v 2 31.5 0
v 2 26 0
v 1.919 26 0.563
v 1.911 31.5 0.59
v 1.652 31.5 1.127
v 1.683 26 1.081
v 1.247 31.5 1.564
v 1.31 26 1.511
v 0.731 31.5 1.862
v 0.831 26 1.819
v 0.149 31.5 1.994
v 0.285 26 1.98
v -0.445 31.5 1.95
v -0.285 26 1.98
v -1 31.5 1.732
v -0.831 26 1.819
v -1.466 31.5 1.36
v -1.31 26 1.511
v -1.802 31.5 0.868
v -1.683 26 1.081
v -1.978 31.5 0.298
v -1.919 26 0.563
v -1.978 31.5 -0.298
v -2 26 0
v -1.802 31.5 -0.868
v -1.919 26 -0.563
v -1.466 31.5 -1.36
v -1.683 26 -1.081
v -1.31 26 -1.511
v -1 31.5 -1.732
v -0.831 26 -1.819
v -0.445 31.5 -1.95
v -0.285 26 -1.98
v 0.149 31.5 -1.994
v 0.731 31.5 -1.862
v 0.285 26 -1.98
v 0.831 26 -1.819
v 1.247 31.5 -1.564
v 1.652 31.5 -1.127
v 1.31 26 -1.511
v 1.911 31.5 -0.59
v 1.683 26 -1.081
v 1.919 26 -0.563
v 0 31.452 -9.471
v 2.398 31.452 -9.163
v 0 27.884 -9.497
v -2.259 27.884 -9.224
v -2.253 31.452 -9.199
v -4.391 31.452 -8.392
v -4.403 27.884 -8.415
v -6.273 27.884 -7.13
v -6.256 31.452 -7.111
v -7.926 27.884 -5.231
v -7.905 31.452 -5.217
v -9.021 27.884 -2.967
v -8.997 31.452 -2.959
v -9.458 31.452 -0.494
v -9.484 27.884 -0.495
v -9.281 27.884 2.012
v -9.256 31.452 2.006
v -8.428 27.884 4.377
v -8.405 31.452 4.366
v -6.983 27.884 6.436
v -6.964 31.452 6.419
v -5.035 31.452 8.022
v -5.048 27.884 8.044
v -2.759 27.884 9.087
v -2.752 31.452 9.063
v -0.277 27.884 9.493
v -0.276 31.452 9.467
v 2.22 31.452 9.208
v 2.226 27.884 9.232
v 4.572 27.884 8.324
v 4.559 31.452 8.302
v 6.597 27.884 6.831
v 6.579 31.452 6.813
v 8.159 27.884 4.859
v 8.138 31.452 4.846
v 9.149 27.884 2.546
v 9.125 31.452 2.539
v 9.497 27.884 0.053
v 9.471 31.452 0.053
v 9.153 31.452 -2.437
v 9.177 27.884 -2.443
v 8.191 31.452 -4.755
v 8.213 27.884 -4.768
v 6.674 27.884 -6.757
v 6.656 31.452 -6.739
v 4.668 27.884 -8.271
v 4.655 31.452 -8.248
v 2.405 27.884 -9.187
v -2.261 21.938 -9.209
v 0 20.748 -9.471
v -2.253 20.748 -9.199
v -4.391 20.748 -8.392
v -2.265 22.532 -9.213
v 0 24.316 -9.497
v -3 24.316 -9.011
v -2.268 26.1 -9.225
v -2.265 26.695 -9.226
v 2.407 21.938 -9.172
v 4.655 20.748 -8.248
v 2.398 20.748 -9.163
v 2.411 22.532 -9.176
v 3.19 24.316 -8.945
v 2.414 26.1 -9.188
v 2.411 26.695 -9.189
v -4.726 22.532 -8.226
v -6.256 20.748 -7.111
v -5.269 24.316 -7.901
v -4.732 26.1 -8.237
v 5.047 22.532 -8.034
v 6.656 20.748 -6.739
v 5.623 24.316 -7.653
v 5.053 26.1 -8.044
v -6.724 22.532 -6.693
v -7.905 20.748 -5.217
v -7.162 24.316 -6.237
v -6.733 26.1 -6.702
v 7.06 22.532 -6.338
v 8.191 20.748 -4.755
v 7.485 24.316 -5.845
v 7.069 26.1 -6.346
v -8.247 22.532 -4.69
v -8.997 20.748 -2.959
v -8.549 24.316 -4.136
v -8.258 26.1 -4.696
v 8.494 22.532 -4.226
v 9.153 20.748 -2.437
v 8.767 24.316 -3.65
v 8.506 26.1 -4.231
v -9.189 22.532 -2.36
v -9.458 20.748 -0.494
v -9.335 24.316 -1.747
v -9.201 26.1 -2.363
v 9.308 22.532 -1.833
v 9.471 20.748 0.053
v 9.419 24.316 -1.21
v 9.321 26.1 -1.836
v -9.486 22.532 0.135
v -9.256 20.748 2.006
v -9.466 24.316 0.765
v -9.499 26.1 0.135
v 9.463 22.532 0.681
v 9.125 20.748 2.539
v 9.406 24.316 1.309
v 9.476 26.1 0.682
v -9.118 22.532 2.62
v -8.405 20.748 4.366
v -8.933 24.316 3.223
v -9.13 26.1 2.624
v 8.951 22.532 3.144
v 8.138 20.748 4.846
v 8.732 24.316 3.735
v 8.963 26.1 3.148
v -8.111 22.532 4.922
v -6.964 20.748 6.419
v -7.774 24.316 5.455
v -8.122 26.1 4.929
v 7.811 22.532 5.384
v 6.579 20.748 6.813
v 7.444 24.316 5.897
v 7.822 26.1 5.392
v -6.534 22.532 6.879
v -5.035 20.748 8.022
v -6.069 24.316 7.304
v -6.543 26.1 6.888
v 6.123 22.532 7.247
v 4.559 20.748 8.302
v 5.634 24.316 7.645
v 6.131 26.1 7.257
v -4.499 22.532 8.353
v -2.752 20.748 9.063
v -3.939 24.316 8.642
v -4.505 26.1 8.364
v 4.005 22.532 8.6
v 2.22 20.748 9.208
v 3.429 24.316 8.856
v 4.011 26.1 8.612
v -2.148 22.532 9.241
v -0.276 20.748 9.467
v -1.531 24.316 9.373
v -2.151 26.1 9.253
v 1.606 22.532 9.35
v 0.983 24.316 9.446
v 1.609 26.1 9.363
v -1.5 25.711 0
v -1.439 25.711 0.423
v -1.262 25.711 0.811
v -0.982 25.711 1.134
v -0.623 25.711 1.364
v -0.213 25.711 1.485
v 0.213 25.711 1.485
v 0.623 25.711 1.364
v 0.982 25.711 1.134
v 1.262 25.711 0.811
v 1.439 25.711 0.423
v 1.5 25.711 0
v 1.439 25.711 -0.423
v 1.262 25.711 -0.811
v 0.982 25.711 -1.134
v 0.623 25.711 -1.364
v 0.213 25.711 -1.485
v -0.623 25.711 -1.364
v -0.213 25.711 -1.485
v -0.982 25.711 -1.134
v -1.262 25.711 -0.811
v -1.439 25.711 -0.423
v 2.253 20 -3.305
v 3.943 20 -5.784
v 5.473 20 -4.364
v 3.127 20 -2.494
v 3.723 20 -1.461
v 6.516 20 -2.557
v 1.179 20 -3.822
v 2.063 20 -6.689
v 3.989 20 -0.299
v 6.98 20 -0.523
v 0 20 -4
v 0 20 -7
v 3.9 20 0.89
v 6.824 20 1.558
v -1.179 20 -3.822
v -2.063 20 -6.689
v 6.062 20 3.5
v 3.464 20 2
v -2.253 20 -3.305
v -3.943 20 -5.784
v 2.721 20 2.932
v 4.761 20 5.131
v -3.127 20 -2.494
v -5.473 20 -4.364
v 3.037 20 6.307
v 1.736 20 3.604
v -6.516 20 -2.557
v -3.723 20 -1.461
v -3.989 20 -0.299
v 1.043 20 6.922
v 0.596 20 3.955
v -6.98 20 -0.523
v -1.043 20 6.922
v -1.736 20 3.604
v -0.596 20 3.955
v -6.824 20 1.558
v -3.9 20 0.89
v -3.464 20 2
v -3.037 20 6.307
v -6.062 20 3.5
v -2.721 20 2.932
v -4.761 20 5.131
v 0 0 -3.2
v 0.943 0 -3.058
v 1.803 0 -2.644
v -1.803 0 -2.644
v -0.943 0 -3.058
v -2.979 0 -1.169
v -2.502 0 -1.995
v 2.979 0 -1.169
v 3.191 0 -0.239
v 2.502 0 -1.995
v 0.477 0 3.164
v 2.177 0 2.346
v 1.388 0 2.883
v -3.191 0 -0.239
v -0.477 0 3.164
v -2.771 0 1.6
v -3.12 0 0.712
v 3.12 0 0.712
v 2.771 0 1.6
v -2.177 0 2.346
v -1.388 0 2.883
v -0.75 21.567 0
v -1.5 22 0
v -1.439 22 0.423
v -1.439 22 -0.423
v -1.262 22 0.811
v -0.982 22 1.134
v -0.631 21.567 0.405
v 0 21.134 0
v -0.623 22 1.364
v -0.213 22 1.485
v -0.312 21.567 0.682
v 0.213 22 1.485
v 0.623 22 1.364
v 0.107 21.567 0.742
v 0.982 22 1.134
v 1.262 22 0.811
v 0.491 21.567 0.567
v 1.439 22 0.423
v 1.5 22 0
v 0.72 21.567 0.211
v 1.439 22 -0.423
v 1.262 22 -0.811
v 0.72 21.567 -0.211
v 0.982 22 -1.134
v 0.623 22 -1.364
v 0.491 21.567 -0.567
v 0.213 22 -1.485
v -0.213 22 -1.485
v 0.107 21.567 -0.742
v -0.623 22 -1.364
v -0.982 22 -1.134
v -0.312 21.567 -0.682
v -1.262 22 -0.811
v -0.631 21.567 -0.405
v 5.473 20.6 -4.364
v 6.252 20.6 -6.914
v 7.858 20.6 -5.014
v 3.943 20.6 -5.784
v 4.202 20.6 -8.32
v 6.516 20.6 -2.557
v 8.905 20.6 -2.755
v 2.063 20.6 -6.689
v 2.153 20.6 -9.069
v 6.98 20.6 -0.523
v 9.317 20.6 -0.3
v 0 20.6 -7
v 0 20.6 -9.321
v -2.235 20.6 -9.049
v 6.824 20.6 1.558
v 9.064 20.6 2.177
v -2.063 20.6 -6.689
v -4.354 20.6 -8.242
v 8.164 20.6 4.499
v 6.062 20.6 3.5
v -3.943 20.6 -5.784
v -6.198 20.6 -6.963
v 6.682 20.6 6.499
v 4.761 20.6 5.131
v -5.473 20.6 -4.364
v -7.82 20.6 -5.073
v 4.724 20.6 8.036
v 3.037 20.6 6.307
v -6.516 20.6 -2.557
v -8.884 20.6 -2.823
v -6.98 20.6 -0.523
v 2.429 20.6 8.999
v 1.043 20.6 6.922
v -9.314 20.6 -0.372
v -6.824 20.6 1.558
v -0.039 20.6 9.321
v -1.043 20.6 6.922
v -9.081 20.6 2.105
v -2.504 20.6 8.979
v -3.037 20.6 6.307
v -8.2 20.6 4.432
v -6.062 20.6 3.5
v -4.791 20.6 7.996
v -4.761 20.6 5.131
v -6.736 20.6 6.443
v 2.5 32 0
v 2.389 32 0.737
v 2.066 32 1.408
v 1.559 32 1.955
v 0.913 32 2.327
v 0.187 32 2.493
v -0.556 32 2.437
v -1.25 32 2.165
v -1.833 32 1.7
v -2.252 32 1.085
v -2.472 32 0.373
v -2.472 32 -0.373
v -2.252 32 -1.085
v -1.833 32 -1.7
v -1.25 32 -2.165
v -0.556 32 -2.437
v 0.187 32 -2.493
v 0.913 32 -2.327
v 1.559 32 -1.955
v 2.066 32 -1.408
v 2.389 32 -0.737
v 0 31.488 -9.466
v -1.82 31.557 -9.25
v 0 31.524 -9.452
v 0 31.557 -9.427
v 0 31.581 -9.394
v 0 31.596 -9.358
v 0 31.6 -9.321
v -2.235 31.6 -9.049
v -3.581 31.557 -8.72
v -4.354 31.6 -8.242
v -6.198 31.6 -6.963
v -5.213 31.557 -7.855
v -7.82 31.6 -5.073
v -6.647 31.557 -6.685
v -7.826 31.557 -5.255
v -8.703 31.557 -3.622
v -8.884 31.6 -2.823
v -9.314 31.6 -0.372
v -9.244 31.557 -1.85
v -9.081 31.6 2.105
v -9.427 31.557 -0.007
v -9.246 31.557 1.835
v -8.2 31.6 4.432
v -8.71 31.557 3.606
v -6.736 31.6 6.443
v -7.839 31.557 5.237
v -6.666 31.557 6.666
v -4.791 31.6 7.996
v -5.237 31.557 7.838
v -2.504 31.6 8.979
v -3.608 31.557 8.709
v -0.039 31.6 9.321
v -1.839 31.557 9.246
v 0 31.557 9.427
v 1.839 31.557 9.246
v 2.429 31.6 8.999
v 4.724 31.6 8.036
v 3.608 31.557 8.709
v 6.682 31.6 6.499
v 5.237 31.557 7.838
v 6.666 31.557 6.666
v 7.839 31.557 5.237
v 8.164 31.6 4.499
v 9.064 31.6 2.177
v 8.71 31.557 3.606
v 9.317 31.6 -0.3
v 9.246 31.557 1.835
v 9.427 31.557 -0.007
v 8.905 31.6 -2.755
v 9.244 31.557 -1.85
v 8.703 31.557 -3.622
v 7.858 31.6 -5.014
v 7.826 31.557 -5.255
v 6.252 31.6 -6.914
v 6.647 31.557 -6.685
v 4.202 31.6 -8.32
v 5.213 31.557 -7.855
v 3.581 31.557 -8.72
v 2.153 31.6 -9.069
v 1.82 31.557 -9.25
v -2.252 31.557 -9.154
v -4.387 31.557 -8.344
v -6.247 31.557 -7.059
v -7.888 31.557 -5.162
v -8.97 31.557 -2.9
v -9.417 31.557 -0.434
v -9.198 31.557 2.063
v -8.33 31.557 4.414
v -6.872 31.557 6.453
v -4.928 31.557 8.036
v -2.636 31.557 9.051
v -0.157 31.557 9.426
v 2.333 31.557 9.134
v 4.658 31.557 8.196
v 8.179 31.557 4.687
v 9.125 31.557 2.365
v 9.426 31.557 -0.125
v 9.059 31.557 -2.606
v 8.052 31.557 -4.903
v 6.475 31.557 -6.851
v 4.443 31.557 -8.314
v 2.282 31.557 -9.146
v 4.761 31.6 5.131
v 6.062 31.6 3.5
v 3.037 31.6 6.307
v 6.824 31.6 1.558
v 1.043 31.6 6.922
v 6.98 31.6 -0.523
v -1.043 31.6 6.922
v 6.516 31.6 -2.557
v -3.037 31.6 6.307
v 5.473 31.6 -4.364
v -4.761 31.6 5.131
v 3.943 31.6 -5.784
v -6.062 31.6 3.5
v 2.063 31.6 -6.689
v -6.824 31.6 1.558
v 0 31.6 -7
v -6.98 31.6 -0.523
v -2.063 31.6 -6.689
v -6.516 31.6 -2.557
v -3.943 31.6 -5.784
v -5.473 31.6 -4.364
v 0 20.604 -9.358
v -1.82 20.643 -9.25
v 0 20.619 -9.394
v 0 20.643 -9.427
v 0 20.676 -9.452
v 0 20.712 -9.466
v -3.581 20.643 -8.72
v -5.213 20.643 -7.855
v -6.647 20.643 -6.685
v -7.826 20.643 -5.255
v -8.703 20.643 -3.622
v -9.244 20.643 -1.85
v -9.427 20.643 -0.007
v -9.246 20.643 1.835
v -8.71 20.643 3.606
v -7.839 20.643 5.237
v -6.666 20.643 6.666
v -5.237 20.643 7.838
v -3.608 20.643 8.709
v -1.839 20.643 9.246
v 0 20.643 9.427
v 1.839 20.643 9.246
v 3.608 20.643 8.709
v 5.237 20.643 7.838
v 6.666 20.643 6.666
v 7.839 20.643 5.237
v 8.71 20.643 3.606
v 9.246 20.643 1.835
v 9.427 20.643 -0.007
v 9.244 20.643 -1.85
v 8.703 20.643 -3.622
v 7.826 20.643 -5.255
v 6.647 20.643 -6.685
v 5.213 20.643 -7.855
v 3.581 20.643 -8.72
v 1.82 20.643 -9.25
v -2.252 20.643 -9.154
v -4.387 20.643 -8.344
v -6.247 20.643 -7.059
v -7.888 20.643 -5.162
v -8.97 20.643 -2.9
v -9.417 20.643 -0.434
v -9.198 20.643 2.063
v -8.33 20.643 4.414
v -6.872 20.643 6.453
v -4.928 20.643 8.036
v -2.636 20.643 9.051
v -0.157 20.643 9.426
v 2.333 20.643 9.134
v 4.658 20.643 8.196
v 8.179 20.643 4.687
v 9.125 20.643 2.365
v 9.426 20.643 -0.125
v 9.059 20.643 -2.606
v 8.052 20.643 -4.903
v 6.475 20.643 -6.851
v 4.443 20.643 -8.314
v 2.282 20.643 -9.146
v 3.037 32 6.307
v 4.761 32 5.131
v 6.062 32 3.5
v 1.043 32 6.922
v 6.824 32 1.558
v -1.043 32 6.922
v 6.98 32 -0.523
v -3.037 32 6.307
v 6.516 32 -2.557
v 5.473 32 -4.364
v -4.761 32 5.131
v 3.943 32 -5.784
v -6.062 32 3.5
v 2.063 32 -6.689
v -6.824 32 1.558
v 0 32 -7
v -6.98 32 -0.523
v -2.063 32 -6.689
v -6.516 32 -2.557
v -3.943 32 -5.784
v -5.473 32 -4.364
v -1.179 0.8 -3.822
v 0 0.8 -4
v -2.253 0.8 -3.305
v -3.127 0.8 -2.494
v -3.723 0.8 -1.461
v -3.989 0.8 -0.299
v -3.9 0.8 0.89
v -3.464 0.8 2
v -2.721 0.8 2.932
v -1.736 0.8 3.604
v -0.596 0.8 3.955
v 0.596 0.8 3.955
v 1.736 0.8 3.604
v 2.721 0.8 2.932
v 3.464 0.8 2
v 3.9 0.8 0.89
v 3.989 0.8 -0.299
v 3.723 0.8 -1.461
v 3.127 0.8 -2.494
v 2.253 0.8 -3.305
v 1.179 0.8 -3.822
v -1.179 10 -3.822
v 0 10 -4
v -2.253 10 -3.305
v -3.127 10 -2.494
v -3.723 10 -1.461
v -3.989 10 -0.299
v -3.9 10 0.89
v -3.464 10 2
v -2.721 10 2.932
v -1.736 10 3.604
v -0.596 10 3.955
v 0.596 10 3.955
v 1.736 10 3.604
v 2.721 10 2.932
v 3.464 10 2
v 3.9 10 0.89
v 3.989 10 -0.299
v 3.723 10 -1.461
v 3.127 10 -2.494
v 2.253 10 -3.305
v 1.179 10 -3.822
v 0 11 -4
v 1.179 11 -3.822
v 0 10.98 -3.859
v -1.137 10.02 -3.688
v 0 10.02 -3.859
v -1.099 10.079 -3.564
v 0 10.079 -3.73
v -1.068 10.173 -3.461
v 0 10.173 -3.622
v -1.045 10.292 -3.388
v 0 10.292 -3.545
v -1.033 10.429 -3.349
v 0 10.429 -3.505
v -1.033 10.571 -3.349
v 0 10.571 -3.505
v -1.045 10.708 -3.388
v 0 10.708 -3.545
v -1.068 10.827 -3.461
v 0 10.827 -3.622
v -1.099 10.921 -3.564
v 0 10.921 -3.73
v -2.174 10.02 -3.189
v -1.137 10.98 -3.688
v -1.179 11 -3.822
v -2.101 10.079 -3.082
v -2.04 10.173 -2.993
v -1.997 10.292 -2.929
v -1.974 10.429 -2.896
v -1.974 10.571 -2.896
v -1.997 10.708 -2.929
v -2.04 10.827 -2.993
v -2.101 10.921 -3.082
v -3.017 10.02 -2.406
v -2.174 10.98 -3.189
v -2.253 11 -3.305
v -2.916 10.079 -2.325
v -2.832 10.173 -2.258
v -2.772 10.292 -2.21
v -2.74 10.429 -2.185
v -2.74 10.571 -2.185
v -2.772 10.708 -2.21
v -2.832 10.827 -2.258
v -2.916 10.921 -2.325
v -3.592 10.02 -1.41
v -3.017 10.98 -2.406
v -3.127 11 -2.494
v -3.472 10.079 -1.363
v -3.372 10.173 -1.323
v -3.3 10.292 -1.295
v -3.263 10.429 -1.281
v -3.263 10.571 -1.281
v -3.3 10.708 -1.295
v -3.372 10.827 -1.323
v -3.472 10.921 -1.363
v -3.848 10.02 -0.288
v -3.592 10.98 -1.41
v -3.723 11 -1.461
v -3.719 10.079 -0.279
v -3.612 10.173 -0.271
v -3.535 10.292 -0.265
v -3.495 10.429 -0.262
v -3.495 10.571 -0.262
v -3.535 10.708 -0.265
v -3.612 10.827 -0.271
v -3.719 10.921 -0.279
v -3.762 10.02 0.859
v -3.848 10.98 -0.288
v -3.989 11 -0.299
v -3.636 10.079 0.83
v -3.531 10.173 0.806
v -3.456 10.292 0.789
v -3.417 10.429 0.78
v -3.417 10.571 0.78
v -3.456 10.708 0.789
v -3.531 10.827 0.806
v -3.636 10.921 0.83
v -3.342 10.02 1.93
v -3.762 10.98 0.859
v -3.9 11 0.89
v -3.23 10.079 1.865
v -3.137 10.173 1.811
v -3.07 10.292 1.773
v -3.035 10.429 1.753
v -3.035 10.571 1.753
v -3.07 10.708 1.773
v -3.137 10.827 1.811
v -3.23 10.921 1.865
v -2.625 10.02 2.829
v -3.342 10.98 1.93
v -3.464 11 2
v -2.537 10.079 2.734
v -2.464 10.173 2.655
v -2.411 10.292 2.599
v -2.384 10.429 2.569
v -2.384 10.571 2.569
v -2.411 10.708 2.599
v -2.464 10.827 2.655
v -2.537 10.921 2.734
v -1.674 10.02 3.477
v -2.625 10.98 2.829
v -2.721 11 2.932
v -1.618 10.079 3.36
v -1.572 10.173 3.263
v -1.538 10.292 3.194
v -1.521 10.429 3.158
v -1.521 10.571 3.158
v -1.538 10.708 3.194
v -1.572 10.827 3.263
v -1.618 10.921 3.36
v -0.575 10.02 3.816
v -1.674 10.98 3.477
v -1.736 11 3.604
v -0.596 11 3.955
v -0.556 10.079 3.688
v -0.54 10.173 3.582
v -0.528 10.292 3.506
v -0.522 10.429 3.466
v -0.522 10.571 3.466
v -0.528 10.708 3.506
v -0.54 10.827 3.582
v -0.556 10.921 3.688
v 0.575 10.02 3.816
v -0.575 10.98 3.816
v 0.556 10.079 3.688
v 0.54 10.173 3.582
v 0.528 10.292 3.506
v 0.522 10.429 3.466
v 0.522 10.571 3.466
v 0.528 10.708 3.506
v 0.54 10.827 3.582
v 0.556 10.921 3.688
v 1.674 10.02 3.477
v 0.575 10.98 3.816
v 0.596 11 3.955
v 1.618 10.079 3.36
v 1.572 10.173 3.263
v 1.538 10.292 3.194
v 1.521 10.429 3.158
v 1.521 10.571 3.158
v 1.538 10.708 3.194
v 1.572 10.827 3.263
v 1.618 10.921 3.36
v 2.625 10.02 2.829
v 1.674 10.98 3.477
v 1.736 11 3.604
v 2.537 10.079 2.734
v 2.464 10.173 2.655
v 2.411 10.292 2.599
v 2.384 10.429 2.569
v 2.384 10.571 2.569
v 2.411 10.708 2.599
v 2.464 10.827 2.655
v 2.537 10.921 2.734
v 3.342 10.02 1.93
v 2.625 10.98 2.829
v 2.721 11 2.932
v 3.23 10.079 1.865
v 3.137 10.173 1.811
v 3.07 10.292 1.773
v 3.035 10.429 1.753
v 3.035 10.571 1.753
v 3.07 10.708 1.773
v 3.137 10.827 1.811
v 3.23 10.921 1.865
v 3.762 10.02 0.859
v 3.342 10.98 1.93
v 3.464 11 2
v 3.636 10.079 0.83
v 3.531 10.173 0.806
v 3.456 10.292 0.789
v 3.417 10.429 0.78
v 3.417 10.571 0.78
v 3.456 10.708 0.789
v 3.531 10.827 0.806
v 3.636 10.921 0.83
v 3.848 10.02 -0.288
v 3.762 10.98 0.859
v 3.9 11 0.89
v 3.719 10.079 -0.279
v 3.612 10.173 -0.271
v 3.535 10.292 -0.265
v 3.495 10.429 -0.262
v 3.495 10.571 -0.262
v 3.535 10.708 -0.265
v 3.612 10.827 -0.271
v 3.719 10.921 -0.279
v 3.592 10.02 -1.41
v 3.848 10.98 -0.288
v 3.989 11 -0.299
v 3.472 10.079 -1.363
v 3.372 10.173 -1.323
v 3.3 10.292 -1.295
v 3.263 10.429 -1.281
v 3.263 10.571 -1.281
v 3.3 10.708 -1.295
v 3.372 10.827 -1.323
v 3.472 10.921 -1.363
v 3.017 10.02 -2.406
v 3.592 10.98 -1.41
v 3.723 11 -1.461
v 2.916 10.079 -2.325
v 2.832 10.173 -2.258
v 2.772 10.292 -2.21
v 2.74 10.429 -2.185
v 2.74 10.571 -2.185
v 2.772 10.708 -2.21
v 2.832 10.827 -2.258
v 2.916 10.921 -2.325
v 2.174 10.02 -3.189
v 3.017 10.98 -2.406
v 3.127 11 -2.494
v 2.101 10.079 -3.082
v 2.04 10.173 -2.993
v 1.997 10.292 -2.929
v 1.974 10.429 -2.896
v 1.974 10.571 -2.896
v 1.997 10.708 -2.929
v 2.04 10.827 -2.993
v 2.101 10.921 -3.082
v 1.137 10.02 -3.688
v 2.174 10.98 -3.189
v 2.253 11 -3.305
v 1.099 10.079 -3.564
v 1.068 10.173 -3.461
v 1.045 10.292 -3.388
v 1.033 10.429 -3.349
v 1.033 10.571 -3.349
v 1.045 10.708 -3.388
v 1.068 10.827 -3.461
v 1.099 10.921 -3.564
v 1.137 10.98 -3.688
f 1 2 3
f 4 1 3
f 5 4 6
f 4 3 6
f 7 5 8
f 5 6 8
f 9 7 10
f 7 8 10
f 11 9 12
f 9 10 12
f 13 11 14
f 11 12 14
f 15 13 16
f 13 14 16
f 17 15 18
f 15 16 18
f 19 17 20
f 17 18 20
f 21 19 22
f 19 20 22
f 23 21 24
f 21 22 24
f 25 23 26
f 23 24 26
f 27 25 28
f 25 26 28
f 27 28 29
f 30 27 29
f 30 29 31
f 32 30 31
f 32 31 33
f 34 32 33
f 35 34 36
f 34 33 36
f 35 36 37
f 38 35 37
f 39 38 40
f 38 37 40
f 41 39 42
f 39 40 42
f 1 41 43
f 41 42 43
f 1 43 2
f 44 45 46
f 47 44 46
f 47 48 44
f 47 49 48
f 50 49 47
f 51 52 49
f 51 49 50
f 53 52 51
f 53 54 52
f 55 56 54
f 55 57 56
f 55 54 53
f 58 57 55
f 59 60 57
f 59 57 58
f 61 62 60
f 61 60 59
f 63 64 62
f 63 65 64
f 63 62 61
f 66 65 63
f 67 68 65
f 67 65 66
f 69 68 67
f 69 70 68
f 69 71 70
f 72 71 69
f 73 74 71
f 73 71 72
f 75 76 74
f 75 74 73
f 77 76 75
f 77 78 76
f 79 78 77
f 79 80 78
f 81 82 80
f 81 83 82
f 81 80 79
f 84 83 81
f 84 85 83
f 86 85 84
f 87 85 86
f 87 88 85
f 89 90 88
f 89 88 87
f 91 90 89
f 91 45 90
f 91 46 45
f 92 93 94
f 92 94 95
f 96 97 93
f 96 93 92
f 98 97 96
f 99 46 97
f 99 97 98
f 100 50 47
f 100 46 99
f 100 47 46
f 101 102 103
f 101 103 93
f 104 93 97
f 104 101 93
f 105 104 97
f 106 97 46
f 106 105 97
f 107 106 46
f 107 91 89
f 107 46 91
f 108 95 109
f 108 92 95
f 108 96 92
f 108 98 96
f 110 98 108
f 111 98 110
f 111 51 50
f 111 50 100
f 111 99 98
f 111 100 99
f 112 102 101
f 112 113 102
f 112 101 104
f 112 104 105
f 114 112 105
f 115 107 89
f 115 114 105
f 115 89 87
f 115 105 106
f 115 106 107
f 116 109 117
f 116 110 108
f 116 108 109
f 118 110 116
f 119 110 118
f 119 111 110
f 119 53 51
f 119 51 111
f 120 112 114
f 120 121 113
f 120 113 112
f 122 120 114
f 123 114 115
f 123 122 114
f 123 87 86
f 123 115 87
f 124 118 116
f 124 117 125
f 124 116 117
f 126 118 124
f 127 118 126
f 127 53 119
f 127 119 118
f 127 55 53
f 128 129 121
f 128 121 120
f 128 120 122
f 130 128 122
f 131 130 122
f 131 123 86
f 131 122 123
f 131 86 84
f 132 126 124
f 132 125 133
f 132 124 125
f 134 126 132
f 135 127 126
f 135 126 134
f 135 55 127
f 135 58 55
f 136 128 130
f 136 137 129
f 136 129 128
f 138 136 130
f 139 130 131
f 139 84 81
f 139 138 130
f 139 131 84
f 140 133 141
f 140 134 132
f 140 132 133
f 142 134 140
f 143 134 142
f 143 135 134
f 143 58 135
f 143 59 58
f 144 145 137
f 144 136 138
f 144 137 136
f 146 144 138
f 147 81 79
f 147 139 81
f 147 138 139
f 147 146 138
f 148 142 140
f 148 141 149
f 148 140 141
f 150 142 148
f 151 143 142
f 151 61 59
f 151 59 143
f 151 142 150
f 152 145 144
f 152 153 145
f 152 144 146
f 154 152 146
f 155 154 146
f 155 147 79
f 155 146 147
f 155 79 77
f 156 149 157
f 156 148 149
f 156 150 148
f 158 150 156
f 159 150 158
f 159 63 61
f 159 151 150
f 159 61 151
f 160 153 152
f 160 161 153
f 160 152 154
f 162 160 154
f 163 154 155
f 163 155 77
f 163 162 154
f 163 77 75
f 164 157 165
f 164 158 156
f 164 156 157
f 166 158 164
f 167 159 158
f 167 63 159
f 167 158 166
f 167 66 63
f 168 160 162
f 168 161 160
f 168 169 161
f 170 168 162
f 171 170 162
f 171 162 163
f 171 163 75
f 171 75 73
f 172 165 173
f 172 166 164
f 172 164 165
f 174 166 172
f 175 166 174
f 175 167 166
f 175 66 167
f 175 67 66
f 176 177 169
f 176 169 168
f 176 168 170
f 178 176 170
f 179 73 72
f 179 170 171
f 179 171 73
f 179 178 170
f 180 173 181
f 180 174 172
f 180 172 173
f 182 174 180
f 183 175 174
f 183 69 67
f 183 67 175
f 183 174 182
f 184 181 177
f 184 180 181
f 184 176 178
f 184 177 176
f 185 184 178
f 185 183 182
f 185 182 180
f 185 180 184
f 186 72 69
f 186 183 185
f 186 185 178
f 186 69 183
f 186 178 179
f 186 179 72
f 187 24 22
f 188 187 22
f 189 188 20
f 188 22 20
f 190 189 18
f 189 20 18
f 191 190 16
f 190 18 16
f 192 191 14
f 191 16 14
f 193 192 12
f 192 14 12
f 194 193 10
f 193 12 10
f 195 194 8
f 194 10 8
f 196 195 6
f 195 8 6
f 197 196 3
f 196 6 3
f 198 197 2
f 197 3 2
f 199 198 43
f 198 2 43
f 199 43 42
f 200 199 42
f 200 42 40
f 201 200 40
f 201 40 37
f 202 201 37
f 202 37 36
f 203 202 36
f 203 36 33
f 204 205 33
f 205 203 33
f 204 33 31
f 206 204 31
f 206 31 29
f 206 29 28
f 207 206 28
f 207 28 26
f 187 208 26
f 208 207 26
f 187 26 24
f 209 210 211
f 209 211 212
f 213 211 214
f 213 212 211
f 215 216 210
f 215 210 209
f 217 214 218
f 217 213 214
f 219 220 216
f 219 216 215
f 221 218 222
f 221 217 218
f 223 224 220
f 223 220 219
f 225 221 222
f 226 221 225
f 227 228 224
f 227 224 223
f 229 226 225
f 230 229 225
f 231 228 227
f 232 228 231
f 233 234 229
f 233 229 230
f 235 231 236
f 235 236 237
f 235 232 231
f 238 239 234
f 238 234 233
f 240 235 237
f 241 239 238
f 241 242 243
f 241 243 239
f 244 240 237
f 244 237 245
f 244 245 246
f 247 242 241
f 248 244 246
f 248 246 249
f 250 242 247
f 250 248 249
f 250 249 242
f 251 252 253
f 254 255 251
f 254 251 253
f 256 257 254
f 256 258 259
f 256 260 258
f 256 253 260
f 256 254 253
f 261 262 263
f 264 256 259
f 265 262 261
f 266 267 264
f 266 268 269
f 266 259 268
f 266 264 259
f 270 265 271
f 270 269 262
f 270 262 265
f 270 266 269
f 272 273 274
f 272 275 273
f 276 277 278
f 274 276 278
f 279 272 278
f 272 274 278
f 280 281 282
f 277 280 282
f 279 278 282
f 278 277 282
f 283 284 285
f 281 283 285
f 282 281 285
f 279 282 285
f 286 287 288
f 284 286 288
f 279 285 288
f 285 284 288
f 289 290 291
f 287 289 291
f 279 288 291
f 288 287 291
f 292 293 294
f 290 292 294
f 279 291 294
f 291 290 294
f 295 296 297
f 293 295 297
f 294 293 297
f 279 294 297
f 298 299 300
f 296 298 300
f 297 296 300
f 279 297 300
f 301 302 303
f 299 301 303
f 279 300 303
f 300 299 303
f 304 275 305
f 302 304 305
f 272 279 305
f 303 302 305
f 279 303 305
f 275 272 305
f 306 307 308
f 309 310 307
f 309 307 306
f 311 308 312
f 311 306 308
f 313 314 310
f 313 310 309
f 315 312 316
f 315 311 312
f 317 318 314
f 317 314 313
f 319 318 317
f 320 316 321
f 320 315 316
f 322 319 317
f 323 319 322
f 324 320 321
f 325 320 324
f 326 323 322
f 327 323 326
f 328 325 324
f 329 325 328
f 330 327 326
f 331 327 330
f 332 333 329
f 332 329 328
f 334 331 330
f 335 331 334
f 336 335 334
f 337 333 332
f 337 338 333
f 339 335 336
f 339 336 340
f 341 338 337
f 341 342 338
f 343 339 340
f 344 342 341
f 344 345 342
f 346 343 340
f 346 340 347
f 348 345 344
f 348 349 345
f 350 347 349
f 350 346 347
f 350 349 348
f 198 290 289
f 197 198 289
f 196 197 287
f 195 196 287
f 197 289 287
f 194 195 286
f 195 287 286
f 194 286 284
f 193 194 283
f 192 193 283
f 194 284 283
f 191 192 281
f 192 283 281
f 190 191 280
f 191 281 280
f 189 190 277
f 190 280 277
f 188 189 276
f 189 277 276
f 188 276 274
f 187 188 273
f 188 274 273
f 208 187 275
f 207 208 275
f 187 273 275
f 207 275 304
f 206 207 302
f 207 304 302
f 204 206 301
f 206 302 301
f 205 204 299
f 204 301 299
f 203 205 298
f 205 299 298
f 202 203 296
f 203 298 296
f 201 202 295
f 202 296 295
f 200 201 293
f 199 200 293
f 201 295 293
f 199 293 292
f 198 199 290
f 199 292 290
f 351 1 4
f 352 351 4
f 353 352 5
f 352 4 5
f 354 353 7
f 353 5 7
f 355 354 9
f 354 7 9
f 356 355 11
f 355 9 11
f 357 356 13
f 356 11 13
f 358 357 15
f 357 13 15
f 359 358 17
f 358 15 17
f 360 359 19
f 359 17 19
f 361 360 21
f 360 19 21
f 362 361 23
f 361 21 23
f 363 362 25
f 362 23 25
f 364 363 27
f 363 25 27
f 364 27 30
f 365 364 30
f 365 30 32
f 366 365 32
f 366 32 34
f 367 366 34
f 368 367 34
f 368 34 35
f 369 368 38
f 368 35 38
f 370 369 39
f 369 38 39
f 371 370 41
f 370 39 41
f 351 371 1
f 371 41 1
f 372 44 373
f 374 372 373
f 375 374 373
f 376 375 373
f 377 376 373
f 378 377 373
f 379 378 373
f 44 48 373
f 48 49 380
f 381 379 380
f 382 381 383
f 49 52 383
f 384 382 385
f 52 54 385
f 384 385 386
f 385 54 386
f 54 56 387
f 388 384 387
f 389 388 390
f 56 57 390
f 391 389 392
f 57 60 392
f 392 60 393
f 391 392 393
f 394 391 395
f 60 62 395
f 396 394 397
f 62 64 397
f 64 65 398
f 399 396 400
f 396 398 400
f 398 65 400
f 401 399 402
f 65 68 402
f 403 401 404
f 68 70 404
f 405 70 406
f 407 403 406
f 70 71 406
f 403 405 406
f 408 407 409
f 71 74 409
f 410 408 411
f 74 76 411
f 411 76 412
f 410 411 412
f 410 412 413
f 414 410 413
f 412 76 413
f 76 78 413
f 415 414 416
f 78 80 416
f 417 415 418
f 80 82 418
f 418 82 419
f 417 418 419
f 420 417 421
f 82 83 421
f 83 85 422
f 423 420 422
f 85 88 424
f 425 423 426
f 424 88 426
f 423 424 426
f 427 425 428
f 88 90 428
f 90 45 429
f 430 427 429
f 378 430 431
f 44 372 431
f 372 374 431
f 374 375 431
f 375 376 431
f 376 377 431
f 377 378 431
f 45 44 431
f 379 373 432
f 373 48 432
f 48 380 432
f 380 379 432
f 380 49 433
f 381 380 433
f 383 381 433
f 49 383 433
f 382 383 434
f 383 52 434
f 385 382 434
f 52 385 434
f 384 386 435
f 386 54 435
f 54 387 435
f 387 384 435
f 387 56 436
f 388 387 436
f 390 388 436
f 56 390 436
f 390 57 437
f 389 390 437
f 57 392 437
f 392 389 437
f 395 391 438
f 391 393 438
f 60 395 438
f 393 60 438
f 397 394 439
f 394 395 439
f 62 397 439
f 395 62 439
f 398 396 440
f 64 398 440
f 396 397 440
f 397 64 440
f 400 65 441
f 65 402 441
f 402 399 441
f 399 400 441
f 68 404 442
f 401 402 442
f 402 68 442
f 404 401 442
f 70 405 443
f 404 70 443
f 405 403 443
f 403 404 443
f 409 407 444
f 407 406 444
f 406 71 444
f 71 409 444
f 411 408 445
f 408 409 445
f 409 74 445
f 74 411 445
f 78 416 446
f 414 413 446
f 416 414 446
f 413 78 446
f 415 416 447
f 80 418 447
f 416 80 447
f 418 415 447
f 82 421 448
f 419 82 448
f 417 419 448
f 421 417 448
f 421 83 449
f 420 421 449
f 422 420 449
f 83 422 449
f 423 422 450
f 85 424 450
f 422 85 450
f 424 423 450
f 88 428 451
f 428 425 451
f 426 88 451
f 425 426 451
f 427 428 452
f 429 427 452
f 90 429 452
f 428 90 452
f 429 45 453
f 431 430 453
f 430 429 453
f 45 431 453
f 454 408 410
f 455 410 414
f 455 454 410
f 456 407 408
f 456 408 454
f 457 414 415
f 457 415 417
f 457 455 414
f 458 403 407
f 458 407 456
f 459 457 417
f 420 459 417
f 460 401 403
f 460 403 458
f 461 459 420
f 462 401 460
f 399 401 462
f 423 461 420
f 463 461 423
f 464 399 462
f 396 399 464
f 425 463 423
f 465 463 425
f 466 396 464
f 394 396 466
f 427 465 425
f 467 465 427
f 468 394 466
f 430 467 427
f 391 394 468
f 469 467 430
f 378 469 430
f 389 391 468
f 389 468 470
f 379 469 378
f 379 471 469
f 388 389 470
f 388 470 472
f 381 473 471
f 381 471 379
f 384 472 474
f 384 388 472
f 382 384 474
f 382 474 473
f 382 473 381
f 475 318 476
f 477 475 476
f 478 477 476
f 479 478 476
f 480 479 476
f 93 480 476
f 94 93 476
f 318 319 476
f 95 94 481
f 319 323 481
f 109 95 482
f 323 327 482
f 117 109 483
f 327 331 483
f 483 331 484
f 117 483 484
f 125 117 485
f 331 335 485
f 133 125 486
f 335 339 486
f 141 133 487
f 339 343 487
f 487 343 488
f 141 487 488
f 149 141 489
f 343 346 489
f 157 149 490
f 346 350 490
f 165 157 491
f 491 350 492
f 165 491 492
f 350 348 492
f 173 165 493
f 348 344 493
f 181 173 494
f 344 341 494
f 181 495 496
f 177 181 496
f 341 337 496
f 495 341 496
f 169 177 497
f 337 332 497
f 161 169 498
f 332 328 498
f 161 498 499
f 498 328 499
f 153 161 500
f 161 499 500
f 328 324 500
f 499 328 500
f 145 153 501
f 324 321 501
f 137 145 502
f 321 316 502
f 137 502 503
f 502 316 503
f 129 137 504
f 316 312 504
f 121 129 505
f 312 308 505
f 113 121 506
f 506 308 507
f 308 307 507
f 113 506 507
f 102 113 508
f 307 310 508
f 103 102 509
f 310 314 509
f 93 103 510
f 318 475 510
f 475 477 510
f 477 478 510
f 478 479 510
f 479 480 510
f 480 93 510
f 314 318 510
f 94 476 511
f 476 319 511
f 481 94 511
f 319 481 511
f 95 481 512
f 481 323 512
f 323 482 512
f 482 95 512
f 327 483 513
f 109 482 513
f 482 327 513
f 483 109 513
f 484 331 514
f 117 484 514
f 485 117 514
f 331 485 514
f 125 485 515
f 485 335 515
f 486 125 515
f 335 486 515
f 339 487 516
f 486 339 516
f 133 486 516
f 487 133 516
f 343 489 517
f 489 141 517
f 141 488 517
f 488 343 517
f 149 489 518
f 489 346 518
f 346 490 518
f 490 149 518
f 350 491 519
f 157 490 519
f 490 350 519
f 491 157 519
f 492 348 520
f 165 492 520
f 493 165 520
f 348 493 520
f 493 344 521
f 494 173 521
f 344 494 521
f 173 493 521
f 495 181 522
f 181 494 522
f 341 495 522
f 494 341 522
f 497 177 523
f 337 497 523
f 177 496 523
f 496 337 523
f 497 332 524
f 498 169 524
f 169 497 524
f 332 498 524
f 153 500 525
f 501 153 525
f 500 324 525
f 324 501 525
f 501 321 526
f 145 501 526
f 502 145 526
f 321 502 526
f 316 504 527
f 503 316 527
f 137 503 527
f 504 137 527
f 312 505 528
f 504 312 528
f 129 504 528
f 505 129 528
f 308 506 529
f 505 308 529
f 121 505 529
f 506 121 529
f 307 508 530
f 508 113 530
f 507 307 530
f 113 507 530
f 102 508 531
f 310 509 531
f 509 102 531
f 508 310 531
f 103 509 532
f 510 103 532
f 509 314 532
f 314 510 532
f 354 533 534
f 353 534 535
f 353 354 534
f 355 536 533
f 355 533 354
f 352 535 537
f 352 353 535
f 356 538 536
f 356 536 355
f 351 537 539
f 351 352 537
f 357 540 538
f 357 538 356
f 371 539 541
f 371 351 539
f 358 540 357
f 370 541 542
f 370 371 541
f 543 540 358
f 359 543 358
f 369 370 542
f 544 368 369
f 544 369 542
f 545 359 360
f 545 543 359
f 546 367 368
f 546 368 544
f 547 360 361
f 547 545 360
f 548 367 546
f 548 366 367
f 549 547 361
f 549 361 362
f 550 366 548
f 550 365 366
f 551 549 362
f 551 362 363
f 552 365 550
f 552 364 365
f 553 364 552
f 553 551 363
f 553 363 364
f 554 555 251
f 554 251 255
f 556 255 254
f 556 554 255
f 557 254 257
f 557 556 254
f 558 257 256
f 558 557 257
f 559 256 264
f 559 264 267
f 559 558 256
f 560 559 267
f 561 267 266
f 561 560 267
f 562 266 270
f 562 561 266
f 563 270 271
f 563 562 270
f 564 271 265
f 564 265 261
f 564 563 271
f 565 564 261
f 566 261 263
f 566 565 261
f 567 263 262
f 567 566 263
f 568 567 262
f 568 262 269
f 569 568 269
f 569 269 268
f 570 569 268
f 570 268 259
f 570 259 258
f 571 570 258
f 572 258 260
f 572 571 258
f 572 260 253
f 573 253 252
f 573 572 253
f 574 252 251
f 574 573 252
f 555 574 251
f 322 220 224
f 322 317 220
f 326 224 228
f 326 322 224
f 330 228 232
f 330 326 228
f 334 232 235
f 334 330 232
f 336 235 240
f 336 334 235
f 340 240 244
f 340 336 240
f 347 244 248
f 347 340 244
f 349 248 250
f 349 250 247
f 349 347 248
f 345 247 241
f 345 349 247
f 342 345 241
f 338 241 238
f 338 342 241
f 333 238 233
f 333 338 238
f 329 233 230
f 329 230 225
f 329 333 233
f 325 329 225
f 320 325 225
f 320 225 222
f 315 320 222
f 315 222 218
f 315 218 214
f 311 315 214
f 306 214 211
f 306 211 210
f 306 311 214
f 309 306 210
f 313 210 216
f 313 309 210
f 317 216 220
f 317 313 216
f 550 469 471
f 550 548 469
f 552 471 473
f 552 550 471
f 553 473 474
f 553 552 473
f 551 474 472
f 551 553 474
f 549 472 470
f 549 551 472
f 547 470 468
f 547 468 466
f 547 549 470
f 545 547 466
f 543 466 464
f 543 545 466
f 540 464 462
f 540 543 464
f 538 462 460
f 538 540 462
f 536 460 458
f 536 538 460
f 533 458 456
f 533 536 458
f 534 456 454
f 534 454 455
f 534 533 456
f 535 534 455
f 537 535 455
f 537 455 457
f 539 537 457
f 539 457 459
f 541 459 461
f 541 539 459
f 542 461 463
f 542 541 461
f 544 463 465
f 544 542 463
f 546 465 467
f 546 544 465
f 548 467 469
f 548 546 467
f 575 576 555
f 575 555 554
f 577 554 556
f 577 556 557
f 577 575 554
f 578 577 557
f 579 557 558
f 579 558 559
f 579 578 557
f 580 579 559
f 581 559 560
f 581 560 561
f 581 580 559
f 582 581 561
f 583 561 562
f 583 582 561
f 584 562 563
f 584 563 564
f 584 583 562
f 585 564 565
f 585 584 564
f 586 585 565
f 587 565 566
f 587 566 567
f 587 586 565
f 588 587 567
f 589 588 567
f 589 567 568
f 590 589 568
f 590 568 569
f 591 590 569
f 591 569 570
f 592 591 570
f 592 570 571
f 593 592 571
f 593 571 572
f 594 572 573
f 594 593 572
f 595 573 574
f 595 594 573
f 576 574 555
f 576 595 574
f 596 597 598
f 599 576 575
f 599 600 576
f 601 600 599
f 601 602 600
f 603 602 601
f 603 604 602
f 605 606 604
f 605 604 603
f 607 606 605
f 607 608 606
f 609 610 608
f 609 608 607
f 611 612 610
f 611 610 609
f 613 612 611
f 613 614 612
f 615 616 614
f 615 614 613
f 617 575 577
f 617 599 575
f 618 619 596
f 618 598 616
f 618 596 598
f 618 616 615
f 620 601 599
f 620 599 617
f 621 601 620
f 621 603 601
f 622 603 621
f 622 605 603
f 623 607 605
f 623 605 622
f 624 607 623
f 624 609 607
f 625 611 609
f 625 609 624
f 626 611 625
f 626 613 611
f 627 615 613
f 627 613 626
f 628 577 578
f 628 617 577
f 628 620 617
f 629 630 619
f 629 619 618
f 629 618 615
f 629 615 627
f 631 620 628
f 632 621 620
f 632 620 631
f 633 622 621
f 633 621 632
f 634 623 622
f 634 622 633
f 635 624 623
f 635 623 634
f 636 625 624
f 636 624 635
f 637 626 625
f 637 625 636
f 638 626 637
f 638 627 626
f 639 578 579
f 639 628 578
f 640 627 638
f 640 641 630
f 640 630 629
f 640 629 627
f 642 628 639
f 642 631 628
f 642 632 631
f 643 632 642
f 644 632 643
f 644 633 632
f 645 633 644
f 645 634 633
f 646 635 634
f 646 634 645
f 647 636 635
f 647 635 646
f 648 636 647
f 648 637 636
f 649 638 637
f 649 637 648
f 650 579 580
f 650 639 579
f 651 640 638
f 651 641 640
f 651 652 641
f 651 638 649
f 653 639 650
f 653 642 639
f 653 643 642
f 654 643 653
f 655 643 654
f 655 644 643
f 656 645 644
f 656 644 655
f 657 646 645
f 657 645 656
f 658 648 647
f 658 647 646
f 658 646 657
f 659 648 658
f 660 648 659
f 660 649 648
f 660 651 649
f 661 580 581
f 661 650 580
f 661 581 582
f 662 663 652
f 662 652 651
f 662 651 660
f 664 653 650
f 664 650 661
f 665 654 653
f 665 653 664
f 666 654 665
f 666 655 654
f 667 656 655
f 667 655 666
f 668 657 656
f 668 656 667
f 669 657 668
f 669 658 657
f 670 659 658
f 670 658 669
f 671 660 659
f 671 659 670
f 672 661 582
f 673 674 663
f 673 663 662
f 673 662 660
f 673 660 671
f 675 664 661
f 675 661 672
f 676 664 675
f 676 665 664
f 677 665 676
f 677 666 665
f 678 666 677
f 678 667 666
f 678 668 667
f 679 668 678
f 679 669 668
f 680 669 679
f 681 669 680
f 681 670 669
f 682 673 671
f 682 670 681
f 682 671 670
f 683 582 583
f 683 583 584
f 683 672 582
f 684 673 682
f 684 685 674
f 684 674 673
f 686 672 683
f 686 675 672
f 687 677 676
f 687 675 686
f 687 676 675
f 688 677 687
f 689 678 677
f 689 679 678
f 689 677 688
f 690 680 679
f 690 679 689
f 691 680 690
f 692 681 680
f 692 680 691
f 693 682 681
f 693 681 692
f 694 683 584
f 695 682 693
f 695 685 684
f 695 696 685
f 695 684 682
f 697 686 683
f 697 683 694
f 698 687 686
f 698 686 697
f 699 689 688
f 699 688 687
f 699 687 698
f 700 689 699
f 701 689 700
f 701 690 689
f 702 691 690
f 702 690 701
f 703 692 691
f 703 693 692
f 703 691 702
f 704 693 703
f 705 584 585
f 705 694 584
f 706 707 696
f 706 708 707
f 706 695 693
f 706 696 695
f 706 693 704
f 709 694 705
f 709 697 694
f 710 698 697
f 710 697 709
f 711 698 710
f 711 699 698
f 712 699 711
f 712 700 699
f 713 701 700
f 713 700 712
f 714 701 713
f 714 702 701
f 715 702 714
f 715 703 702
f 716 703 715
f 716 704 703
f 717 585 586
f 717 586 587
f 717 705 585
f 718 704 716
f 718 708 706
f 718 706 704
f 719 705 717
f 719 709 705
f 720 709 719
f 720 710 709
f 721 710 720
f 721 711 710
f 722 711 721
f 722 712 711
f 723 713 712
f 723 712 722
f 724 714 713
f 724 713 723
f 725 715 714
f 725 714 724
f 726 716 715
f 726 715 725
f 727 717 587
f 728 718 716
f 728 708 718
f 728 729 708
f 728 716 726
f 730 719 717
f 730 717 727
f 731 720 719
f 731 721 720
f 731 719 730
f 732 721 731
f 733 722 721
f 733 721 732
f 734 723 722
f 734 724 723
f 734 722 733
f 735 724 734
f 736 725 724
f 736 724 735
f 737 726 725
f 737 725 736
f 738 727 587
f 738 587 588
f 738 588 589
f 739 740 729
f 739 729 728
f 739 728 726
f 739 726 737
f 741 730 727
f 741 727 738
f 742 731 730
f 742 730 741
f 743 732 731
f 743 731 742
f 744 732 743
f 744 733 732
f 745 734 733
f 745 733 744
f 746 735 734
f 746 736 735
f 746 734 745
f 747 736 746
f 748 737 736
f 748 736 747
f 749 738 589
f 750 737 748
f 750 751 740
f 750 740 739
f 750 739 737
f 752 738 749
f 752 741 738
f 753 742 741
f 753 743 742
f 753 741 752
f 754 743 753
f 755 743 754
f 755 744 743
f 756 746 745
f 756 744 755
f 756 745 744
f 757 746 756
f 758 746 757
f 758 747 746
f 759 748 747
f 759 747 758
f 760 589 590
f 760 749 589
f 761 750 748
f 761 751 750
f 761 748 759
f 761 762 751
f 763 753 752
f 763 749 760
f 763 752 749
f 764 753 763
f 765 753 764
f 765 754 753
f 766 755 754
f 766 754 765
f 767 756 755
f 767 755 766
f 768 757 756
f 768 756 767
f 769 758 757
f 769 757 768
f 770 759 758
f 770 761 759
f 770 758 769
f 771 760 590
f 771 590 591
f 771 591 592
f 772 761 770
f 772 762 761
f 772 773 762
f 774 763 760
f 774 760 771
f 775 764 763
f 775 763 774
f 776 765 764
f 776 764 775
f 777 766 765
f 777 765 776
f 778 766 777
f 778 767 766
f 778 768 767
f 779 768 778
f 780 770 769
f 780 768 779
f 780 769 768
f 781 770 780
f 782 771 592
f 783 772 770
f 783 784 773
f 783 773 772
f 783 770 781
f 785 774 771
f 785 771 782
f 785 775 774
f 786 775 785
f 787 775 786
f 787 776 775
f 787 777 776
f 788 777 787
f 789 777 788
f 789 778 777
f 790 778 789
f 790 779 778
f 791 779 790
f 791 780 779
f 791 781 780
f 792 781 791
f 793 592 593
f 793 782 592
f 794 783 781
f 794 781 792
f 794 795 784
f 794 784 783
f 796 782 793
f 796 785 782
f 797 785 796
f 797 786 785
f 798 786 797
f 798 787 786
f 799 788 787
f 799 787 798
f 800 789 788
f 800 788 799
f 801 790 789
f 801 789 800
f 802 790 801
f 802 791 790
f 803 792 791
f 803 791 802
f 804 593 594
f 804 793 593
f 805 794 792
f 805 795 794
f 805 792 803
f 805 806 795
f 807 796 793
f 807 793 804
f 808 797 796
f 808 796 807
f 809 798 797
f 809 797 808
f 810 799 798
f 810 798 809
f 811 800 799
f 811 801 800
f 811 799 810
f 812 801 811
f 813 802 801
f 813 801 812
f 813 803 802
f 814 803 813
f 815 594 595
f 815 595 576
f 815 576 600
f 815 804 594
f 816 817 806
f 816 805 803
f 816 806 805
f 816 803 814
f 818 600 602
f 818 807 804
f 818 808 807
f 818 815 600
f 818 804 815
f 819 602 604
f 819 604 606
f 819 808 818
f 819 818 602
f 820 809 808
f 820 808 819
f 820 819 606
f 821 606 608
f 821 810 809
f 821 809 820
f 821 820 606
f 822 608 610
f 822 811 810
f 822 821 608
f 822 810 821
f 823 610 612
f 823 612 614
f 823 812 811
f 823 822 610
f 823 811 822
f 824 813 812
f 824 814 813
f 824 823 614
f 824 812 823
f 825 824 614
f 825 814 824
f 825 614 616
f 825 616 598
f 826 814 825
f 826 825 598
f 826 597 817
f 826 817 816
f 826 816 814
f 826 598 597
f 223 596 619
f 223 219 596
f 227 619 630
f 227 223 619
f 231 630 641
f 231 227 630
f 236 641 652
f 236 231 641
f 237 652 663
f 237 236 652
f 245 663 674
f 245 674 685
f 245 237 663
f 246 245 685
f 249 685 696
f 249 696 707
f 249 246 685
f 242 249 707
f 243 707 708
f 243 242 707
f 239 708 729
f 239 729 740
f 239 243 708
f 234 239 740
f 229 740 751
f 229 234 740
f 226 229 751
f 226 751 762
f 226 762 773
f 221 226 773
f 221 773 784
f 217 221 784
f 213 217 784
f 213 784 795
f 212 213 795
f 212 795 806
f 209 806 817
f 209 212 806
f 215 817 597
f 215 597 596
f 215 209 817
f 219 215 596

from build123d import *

# Parameters (mm, degrees)
CHANFREIN1_SIZE = 0.8
PER_AGE1_D      = 3
PER_AGE1_DEPTH  = 10
PER_AGE1_TIP    = 0.866025404
PER_AGE2_D      = 4
PER_AGE2_DEPTH  = 6
PER_AGE2_TIP    = 1.154700538
CONG_1_R        = 0.15
CHANFREIN2_SIZE = 0.5


with BuildPart() as part:
    # Esquisse1 → Base-Révolution (revolve)
    with BuildSketch(Plane.XY, mode=Mode.PRIVATE) as base_r_volution_sk:
        with BuildLine():
            Line((0, 0), (4, 0))
            Line((4, 0), (4, 10))
            ThreePointArc((4, 10), (3.5, 10.5), (4, 11))
            Line((4, 11), (4, 20))
            Line((4, 20), (7, 20))
            Line((7, 20), (7, 20.6))
            Line((7, 20.6), (9.469749085, 20.6))
            ThreePointArc((9.469749085, 20.6), (9.5, 26.1), (9.469749085, 31.6))
            Line((9.469749085, 31.6), (7, 31.6))
            Line((7, 31.6), (7, 32))
            Line((7, 32), (0, 32))
            Line((0, 32), (0, 0))
        make_face()
    revolve(base_r_volution_sk.sketch.rotate(Axis((0, -6.89025894, 0), (0, 1, 0)), 90), axis=Axis((0, -6.89025894, 0), (0, 1, 0)))

    # Chanfrein1
    chanfrein1_edges = [part.edges().sort_by_distance(p)[0] for p in [
        (0, 0, 4),
    ]]
    chamfer(chanfrein1_edges, length=CHANFREIN1_SIZE)

    # Perçage1
    with Locations(Plane(origin=(0, 32, 0), x_dir=(-1, 0, 0), z_dir=(0, 1, 0))):
        with Locations((0, 0)):
            Hole(PER_AGE1_D / 2, depth=PER_AGE1_DEPTH)
            with Locations((0, 0, -(PER_AGE1_DEPTH + PER_AGE1_TIP / 2))):  # 120° drill point
                Cone(0, PER_AGE1_D / 2, PER_AGE1_TIP, mode=Mode.SUBTRACT)

    # Perçage2
    with Locations(Plane(origin=(0, 32, 0), x_dir=(-1, 0, 0), z_dir=(0, 1, 0))):
        with Locations((0, 0)):
            Hole(PER_AGE2_D / 2, depth=PER_AGE2_DEPTH)
            with Locations((0, 0, -(PER_AGE2_DEPTH + PER_AGE2_TIP / 2))):  # 120° drill point
                Cone(0, PER_AGE2_D / 2, PER_AGE2_TIP, mode=Mode.SUBTRACT)

    # Congé1
    cong_1_edges = [part.edges().sort_by_distance(p)[0] for p in [
        (0, 20.6, 9.469749085),
        (0, 31.6, 9.469749085),
    ]]
    fillet(cong_1_edges, radius=CONG_1_R)

    # Chanfrein2
    chanfrein2_edges = [part.edges().sort_by_distance(p)[0] for p in [
        (-2, 32, 0),
    ]]
    chamfer(chanfrein2_edges, length=CHANFREIN2_SIZE)


solid = part.part
